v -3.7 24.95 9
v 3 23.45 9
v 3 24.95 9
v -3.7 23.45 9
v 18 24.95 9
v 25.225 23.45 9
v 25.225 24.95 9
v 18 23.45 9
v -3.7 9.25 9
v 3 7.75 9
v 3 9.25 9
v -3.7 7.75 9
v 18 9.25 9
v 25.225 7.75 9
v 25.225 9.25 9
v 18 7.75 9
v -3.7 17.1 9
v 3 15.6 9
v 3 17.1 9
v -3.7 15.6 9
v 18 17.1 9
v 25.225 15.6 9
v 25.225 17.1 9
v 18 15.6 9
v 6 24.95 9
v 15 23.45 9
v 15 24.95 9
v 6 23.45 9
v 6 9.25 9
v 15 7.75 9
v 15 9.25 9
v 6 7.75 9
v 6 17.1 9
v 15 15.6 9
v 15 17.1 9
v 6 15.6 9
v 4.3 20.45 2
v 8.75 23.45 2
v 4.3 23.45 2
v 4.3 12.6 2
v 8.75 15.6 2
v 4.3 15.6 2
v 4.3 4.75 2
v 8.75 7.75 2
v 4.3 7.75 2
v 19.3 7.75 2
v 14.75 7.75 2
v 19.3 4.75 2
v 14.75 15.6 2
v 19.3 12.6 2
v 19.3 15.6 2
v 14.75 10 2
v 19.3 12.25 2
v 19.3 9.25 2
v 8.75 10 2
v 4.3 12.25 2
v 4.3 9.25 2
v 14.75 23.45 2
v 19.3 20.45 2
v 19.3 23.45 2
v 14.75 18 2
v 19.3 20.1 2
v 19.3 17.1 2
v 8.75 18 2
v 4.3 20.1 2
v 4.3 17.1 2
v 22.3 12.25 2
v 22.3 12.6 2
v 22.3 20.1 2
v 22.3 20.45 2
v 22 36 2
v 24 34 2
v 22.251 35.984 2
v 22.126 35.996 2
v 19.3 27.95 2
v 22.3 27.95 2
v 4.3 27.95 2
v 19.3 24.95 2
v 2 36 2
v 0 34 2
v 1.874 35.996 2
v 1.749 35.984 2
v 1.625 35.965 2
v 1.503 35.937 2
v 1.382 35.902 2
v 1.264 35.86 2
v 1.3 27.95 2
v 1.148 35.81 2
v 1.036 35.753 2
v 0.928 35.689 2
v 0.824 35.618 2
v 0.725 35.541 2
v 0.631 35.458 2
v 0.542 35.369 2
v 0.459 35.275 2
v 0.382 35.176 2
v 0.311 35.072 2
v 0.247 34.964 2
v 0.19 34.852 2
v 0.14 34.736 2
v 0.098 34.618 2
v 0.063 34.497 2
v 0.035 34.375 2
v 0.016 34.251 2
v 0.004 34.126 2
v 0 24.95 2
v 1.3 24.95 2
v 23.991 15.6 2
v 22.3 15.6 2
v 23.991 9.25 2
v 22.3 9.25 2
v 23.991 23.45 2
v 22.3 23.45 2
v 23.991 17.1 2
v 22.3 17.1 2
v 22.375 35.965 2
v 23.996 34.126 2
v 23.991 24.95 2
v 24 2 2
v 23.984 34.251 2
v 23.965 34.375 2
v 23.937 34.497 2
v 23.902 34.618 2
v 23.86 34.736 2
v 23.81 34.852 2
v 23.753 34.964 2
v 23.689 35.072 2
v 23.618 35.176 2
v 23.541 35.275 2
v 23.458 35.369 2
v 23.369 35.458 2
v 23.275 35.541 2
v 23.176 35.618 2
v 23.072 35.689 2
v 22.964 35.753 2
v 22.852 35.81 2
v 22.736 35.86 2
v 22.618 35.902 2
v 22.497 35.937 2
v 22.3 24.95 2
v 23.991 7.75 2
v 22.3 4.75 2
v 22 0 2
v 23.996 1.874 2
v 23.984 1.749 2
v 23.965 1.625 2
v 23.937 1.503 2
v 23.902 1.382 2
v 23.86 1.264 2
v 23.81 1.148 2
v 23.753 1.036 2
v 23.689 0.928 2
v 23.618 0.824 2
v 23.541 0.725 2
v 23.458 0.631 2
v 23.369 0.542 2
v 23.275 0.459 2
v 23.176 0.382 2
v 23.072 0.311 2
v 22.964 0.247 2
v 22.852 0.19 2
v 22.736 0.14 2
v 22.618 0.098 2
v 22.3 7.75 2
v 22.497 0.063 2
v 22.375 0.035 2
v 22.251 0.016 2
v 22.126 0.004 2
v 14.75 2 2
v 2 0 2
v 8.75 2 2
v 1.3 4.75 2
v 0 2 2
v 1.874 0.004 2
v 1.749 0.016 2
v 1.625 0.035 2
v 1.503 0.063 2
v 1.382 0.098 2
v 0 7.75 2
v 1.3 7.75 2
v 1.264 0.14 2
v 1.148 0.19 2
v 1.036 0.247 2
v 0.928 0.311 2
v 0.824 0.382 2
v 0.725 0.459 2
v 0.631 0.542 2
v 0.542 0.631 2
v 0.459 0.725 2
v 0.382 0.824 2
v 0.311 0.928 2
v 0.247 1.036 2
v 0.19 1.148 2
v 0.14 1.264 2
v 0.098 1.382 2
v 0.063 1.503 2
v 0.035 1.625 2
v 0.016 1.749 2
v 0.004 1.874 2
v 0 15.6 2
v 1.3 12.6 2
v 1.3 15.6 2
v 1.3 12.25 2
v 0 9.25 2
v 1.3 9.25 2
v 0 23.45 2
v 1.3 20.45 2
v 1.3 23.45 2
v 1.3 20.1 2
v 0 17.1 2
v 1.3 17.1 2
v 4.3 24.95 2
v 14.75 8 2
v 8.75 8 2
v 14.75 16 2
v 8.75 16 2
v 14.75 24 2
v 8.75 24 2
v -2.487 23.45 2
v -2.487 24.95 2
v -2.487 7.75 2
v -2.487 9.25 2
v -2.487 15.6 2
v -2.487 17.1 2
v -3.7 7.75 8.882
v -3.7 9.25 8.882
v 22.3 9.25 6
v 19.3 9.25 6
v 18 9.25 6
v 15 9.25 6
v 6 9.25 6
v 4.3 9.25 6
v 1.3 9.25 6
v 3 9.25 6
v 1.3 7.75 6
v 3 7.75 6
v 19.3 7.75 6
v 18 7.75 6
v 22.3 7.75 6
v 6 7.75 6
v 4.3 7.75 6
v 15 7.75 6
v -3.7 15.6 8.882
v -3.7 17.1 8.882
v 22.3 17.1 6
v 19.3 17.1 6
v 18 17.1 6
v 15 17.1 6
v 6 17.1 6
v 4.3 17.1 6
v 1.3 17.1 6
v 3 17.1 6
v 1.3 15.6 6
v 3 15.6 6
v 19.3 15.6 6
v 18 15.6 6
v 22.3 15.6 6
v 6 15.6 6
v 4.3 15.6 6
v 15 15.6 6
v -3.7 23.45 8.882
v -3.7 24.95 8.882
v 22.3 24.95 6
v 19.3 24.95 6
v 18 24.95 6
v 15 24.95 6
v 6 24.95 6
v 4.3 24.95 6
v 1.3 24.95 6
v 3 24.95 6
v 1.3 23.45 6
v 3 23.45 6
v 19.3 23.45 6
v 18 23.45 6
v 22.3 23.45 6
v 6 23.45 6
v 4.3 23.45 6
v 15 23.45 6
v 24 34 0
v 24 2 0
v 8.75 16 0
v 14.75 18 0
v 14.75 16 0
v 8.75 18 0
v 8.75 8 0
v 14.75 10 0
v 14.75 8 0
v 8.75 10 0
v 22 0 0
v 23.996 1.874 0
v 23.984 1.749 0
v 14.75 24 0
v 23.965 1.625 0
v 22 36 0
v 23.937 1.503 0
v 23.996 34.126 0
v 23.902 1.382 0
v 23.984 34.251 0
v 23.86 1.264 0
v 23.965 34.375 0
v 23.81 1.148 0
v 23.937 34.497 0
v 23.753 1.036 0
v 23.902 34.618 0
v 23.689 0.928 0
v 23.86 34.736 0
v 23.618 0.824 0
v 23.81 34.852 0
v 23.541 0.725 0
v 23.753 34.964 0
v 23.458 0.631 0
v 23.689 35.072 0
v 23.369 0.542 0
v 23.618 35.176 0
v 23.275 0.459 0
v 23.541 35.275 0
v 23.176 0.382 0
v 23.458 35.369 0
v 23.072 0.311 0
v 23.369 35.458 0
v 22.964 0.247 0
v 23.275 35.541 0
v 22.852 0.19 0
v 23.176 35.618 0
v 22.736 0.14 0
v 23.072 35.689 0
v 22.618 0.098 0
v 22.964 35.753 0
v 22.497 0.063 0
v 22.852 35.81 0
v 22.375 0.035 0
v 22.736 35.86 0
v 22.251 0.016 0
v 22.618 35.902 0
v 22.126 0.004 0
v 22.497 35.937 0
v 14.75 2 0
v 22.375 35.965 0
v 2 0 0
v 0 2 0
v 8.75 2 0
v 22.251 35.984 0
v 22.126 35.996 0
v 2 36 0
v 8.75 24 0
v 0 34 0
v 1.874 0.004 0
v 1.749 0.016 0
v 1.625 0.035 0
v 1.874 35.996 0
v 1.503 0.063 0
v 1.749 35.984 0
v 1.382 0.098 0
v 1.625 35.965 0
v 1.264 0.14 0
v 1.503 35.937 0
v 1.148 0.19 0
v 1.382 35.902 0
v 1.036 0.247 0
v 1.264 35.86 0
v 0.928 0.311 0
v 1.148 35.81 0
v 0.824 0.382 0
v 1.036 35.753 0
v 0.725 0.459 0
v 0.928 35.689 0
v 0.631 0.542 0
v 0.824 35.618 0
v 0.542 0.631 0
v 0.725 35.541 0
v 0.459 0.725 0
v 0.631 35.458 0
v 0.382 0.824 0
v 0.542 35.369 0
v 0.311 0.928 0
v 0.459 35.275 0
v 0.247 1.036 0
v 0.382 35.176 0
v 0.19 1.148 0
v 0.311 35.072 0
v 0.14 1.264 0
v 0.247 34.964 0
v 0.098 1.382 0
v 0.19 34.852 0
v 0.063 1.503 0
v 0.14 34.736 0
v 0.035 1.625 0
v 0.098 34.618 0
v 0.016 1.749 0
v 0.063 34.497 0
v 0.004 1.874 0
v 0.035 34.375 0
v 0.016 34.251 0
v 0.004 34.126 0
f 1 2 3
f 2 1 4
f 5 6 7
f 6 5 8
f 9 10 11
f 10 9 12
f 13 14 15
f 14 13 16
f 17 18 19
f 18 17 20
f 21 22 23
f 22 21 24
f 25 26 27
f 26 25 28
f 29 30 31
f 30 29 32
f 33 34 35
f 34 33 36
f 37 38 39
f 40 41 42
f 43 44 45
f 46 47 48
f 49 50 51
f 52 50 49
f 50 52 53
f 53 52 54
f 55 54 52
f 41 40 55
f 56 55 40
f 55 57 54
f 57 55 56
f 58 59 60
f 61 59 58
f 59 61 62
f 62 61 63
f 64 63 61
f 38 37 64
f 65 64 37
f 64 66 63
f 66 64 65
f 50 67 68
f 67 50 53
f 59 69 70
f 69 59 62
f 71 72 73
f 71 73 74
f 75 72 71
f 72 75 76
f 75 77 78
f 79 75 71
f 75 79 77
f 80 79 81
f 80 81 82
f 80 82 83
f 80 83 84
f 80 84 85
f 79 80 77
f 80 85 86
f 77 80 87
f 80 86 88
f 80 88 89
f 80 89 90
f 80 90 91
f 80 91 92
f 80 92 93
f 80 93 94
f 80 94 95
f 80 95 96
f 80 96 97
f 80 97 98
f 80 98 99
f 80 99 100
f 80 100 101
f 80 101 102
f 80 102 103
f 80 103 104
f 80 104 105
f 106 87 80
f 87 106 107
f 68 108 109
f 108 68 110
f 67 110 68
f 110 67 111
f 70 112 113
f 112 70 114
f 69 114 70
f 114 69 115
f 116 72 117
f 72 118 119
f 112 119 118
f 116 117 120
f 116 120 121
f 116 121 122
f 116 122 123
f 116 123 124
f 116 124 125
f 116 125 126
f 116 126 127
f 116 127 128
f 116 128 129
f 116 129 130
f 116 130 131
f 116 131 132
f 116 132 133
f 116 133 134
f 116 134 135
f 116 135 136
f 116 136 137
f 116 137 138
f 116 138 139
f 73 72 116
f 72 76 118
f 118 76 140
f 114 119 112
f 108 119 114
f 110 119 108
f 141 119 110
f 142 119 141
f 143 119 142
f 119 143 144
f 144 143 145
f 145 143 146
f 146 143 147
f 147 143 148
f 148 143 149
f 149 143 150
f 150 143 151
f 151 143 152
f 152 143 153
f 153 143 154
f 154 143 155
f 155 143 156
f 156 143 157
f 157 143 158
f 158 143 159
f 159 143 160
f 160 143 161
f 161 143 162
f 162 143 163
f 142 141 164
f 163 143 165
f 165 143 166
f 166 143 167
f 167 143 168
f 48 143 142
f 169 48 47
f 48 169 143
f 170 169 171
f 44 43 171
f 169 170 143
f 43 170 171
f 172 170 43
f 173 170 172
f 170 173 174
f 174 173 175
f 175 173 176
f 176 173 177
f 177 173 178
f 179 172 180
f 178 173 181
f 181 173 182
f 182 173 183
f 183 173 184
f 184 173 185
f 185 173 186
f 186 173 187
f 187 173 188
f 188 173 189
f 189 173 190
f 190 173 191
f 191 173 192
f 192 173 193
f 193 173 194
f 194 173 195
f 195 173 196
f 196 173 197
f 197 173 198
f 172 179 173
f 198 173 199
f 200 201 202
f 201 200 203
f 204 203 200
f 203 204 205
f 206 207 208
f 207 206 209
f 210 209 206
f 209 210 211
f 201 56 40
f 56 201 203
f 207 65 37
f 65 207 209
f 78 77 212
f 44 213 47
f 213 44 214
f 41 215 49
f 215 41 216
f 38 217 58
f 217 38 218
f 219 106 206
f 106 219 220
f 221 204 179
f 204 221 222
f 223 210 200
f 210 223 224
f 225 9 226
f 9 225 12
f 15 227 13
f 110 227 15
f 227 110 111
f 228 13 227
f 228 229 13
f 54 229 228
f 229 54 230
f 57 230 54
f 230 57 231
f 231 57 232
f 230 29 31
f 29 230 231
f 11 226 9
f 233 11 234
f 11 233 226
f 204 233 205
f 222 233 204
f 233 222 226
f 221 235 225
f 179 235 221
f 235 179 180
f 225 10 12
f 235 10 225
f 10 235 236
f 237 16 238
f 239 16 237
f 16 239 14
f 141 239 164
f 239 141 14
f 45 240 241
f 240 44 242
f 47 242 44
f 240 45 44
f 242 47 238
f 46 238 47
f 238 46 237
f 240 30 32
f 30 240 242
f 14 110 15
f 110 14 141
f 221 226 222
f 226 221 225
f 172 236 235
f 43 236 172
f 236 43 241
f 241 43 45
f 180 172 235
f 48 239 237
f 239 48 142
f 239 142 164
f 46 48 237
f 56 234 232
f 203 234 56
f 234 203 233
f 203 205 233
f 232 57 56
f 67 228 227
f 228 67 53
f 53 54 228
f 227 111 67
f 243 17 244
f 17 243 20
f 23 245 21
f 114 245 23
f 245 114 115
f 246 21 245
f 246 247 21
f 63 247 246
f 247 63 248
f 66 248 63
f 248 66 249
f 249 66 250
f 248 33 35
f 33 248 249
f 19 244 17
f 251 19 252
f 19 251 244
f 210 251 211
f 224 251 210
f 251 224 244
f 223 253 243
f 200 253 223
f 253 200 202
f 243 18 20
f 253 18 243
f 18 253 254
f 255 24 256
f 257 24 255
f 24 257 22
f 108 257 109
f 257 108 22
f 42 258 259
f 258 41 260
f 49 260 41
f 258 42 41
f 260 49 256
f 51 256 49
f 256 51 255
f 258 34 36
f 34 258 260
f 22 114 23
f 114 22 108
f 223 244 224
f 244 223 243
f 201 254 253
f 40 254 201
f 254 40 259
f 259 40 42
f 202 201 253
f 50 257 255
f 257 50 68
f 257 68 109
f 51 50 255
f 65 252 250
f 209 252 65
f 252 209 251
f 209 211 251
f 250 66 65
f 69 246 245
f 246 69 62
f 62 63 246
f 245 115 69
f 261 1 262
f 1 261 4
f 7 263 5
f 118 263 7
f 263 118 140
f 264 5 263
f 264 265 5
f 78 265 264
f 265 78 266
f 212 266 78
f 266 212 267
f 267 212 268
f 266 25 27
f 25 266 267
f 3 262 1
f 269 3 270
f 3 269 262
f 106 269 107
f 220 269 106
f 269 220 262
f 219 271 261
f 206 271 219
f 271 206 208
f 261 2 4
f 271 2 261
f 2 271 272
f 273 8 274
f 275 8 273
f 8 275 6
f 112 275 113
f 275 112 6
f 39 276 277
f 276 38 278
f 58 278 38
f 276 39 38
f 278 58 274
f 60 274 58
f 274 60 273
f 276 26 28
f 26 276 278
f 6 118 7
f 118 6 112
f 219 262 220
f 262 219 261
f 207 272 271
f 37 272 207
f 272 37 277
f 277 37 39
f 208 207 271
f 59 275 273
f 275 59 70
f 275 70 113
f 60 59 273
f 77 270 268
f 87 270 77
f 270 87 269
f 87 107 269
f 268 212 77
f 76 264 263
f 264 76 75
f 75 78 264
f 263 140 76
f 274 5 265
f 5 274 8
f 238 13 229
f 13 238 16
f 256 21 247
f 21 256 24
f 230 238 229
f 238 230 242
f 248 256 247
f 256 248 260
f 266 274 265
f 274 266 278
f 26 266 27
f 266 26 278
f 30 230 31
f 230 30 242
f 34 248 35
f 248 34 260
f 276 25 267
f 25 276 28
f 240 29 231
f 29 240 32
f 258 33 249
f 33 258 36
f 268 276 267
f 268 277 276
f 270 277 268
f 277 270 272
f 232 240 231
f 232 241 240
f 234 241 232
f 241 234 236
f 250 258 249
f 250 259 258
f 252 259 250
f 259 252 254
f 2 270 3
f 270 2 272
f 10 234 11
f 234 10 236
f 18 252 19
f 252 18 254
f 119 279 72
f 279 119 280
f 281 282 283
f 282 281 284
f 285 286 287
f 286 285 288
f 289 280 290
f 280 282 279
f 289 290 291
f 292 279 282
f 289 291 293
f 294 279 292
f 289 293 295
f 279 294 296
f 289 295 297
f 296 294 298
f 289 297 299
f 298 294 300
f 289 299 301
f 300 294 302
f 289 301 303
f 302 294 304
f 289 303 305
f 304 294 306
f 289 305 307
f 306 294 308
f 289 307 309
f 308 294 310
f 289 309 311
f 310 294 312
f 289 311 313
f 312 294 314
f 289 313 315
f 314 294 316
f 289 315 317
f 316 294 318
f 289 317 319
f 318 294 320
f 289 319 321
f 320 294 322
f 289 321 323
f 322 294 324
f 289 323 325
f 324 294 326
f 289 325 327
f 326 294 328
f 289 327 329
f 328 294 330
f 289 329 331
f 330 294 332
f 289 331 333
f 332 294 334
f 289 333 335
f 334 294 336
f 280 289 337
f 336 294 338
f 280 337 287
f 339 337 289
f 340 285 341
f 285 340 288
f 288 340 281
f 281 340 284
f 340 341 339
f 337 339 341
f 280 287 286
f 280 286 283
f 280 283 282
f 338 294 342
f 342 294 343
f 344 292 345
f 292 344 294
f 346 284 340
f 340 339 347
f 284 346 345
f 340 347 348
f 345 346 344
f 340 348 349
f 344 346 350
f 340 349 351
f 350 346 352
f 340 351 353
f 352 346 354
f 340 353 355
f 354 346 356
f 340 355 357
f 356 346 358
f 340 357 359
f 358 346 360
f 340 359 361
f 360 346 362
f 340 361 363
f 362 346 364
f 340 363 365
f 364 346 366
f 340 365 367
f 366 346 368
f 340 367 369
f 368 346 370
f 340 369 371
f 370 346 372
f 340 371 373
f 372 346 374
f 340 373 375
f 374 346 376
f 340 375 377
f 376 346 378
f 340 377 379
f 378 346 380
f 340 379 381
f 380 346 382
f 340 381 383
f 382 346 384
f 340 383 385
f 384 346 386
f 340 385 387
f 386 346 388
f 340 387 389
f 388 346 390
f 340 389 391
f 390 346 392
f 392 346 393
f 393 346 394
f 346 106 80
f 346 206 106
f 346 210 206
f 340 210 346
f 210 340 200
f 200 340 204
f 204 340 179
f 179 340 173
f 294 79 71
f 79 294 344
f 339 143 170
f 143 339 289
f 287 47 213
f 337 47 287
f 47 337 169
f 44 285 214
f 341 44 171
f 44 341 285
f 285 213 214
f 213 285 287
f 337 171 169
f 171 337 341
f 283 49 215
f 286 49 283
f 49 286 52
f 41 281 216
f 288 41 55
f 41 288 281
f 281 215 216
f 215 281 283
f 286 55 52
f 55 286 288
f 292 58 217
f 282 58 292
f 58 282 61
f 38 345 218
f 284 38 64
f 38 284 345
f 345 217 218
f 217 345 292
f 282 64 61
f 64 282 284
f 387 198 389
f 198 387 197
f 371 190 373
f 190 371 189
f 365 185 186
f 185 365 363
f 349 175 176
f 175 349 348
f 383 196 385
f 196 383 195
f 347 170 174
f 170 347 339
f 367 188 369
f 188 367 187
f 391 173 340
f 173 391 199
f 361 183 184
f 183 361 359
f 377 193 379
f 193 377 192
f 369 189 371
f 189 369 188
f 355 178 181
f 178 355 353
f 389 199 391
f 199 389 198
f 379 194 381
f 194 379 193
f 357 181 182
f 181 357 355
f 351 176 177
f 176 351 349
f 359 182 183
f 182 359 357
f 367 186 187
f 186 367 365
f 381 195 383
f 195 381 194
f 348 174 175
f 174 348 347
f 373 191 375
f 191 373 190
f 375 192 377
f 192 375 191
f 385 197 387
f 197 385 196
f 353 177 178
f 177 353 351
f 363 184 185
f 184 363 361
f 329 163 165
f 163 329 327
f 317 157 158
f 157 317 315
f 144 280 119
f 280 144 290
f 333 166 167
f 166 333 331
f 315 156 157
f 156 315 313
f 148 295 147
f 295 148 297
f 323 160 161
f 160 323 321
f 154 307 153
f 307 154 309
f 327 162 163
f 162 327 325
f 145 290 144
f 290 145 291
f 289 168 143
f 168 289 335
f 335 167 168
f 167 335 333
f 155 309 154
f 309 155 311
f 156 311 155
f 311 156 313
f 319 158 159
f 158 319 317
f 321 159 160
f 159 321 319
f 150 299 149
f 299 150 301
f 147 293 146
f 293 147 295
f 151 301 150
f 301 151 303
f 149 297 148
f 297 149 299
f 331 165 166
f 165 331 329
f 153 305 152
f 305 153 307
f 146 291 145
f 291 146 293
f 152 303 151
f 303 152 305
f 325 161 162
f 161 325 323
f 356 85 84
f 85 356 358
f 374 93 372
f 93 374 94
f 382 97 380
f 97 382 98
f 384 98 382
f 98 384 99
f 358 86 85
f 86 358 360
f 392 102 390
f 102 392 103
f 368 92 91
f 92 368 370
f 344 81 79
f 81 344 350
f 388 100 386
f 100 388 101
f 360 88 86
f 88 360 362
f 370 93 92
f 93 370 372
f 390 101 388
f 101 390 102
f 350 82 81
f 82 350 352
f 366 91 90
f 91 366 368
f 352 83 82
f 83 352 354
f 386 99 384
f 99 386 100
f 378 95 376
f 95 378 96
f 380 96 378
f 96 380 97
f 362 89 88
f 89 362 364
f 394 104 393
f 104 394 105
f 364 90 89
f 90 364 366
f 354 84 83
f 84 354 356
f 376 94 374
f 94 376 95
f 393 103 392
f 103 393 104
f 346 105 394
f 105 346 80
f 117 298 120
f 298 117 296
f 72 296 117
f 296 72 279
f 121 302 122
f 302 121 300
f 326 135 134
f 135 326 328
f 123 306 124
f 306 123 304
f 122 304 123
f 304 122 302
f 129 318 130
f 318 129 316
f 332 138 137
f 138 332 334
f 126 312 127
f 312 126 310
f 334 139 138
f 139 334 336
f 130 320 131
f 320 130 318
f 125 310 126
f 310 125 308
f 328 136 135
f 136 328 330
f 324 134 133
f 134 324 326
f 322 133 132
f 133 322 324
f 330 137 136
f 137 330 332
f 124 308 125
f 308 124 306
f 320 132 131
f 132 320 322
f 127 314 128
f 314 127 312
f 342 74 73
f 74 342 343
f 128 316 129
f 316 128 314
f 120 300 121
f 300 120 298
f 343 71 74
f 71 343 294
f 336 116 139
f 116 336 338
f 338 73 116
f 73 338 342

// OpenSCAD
$fn = 100; 

translate([2, 2, 0]) cylinder(2, 2, 2);
translate([22, 2, 0]) cylinder(2, 2, 2);
translate([2, 34, 0]) cylinder(2, 2, 2);
translate([22, 34, 0]) cylinder(2, 2, 2);

difference () {
    assembled_dividers();
    translate ([15, 0, 6]) cube([3, 50, 3]);
    translate ([3, 0, 6]) cube([3, 50, 3]);
    
    }
difference () {
	cube([24, 36, 2]);
	translate([8.75, 2, -0.1]) cube([6, 6, 2.2]);
	translate([8.75, 10, -0.1]) cube([6, 6, 2.2]);
	translate([8.75, 18, -0.1]) cube([6, 6, 2.2]);
  	translate([0, 0, -0.1]) cube([2, 2, 2.2]);
    translate([22, 0, -0.1]) cube([2, 2, 2.2]);
    translate([0, 34, -0.1]) cube([2, 2, 2.2]);
    translate([22, 34, -0.1]) cube([2, 2, 2.2]);

}

module assembled_dividers () {
    translate ([-3.7, 7.75, 2]) divider();
    translate ([-3.7, 15.6, 2]) divider();
    translate ([-3.7, 23.45, 2]) divider();
}

module divider () {
	difference () {
		cube([29, 1.5, 7]);
		translate([27.25, -2, -2.5]) rotate([0, 10, 0]) cube([10, 10, 10]);
		translate([-8.5, -2, -2.5]) rotate([0, 350, 0]) cube([10, 10, 10]);
	
	}
	translate ([5, -3, 0]) prism(3, 3, 4);
	translate ([23, -3, 0]) prism(3, 3, 4);
	translate ([8, 4.5, 0]) rotate ([0, 0, 180]) prism(3, 3, 4);
	translate ([26, 4.5, 0]) rotate ([0, 0, 180]) prism(3, 3, 4);

}



module prism(l, w, h){
	polyhedron(
             points=[[0,0,0], [l,0,0], [l,w,0], [0,w,0], [0,w,h], [l,w,h]],
             faces=[[0,1,2,3],[5,4,3,2],[0,4,5,1],[0,3,4],[5,2,1]]
              );
  
}
   
